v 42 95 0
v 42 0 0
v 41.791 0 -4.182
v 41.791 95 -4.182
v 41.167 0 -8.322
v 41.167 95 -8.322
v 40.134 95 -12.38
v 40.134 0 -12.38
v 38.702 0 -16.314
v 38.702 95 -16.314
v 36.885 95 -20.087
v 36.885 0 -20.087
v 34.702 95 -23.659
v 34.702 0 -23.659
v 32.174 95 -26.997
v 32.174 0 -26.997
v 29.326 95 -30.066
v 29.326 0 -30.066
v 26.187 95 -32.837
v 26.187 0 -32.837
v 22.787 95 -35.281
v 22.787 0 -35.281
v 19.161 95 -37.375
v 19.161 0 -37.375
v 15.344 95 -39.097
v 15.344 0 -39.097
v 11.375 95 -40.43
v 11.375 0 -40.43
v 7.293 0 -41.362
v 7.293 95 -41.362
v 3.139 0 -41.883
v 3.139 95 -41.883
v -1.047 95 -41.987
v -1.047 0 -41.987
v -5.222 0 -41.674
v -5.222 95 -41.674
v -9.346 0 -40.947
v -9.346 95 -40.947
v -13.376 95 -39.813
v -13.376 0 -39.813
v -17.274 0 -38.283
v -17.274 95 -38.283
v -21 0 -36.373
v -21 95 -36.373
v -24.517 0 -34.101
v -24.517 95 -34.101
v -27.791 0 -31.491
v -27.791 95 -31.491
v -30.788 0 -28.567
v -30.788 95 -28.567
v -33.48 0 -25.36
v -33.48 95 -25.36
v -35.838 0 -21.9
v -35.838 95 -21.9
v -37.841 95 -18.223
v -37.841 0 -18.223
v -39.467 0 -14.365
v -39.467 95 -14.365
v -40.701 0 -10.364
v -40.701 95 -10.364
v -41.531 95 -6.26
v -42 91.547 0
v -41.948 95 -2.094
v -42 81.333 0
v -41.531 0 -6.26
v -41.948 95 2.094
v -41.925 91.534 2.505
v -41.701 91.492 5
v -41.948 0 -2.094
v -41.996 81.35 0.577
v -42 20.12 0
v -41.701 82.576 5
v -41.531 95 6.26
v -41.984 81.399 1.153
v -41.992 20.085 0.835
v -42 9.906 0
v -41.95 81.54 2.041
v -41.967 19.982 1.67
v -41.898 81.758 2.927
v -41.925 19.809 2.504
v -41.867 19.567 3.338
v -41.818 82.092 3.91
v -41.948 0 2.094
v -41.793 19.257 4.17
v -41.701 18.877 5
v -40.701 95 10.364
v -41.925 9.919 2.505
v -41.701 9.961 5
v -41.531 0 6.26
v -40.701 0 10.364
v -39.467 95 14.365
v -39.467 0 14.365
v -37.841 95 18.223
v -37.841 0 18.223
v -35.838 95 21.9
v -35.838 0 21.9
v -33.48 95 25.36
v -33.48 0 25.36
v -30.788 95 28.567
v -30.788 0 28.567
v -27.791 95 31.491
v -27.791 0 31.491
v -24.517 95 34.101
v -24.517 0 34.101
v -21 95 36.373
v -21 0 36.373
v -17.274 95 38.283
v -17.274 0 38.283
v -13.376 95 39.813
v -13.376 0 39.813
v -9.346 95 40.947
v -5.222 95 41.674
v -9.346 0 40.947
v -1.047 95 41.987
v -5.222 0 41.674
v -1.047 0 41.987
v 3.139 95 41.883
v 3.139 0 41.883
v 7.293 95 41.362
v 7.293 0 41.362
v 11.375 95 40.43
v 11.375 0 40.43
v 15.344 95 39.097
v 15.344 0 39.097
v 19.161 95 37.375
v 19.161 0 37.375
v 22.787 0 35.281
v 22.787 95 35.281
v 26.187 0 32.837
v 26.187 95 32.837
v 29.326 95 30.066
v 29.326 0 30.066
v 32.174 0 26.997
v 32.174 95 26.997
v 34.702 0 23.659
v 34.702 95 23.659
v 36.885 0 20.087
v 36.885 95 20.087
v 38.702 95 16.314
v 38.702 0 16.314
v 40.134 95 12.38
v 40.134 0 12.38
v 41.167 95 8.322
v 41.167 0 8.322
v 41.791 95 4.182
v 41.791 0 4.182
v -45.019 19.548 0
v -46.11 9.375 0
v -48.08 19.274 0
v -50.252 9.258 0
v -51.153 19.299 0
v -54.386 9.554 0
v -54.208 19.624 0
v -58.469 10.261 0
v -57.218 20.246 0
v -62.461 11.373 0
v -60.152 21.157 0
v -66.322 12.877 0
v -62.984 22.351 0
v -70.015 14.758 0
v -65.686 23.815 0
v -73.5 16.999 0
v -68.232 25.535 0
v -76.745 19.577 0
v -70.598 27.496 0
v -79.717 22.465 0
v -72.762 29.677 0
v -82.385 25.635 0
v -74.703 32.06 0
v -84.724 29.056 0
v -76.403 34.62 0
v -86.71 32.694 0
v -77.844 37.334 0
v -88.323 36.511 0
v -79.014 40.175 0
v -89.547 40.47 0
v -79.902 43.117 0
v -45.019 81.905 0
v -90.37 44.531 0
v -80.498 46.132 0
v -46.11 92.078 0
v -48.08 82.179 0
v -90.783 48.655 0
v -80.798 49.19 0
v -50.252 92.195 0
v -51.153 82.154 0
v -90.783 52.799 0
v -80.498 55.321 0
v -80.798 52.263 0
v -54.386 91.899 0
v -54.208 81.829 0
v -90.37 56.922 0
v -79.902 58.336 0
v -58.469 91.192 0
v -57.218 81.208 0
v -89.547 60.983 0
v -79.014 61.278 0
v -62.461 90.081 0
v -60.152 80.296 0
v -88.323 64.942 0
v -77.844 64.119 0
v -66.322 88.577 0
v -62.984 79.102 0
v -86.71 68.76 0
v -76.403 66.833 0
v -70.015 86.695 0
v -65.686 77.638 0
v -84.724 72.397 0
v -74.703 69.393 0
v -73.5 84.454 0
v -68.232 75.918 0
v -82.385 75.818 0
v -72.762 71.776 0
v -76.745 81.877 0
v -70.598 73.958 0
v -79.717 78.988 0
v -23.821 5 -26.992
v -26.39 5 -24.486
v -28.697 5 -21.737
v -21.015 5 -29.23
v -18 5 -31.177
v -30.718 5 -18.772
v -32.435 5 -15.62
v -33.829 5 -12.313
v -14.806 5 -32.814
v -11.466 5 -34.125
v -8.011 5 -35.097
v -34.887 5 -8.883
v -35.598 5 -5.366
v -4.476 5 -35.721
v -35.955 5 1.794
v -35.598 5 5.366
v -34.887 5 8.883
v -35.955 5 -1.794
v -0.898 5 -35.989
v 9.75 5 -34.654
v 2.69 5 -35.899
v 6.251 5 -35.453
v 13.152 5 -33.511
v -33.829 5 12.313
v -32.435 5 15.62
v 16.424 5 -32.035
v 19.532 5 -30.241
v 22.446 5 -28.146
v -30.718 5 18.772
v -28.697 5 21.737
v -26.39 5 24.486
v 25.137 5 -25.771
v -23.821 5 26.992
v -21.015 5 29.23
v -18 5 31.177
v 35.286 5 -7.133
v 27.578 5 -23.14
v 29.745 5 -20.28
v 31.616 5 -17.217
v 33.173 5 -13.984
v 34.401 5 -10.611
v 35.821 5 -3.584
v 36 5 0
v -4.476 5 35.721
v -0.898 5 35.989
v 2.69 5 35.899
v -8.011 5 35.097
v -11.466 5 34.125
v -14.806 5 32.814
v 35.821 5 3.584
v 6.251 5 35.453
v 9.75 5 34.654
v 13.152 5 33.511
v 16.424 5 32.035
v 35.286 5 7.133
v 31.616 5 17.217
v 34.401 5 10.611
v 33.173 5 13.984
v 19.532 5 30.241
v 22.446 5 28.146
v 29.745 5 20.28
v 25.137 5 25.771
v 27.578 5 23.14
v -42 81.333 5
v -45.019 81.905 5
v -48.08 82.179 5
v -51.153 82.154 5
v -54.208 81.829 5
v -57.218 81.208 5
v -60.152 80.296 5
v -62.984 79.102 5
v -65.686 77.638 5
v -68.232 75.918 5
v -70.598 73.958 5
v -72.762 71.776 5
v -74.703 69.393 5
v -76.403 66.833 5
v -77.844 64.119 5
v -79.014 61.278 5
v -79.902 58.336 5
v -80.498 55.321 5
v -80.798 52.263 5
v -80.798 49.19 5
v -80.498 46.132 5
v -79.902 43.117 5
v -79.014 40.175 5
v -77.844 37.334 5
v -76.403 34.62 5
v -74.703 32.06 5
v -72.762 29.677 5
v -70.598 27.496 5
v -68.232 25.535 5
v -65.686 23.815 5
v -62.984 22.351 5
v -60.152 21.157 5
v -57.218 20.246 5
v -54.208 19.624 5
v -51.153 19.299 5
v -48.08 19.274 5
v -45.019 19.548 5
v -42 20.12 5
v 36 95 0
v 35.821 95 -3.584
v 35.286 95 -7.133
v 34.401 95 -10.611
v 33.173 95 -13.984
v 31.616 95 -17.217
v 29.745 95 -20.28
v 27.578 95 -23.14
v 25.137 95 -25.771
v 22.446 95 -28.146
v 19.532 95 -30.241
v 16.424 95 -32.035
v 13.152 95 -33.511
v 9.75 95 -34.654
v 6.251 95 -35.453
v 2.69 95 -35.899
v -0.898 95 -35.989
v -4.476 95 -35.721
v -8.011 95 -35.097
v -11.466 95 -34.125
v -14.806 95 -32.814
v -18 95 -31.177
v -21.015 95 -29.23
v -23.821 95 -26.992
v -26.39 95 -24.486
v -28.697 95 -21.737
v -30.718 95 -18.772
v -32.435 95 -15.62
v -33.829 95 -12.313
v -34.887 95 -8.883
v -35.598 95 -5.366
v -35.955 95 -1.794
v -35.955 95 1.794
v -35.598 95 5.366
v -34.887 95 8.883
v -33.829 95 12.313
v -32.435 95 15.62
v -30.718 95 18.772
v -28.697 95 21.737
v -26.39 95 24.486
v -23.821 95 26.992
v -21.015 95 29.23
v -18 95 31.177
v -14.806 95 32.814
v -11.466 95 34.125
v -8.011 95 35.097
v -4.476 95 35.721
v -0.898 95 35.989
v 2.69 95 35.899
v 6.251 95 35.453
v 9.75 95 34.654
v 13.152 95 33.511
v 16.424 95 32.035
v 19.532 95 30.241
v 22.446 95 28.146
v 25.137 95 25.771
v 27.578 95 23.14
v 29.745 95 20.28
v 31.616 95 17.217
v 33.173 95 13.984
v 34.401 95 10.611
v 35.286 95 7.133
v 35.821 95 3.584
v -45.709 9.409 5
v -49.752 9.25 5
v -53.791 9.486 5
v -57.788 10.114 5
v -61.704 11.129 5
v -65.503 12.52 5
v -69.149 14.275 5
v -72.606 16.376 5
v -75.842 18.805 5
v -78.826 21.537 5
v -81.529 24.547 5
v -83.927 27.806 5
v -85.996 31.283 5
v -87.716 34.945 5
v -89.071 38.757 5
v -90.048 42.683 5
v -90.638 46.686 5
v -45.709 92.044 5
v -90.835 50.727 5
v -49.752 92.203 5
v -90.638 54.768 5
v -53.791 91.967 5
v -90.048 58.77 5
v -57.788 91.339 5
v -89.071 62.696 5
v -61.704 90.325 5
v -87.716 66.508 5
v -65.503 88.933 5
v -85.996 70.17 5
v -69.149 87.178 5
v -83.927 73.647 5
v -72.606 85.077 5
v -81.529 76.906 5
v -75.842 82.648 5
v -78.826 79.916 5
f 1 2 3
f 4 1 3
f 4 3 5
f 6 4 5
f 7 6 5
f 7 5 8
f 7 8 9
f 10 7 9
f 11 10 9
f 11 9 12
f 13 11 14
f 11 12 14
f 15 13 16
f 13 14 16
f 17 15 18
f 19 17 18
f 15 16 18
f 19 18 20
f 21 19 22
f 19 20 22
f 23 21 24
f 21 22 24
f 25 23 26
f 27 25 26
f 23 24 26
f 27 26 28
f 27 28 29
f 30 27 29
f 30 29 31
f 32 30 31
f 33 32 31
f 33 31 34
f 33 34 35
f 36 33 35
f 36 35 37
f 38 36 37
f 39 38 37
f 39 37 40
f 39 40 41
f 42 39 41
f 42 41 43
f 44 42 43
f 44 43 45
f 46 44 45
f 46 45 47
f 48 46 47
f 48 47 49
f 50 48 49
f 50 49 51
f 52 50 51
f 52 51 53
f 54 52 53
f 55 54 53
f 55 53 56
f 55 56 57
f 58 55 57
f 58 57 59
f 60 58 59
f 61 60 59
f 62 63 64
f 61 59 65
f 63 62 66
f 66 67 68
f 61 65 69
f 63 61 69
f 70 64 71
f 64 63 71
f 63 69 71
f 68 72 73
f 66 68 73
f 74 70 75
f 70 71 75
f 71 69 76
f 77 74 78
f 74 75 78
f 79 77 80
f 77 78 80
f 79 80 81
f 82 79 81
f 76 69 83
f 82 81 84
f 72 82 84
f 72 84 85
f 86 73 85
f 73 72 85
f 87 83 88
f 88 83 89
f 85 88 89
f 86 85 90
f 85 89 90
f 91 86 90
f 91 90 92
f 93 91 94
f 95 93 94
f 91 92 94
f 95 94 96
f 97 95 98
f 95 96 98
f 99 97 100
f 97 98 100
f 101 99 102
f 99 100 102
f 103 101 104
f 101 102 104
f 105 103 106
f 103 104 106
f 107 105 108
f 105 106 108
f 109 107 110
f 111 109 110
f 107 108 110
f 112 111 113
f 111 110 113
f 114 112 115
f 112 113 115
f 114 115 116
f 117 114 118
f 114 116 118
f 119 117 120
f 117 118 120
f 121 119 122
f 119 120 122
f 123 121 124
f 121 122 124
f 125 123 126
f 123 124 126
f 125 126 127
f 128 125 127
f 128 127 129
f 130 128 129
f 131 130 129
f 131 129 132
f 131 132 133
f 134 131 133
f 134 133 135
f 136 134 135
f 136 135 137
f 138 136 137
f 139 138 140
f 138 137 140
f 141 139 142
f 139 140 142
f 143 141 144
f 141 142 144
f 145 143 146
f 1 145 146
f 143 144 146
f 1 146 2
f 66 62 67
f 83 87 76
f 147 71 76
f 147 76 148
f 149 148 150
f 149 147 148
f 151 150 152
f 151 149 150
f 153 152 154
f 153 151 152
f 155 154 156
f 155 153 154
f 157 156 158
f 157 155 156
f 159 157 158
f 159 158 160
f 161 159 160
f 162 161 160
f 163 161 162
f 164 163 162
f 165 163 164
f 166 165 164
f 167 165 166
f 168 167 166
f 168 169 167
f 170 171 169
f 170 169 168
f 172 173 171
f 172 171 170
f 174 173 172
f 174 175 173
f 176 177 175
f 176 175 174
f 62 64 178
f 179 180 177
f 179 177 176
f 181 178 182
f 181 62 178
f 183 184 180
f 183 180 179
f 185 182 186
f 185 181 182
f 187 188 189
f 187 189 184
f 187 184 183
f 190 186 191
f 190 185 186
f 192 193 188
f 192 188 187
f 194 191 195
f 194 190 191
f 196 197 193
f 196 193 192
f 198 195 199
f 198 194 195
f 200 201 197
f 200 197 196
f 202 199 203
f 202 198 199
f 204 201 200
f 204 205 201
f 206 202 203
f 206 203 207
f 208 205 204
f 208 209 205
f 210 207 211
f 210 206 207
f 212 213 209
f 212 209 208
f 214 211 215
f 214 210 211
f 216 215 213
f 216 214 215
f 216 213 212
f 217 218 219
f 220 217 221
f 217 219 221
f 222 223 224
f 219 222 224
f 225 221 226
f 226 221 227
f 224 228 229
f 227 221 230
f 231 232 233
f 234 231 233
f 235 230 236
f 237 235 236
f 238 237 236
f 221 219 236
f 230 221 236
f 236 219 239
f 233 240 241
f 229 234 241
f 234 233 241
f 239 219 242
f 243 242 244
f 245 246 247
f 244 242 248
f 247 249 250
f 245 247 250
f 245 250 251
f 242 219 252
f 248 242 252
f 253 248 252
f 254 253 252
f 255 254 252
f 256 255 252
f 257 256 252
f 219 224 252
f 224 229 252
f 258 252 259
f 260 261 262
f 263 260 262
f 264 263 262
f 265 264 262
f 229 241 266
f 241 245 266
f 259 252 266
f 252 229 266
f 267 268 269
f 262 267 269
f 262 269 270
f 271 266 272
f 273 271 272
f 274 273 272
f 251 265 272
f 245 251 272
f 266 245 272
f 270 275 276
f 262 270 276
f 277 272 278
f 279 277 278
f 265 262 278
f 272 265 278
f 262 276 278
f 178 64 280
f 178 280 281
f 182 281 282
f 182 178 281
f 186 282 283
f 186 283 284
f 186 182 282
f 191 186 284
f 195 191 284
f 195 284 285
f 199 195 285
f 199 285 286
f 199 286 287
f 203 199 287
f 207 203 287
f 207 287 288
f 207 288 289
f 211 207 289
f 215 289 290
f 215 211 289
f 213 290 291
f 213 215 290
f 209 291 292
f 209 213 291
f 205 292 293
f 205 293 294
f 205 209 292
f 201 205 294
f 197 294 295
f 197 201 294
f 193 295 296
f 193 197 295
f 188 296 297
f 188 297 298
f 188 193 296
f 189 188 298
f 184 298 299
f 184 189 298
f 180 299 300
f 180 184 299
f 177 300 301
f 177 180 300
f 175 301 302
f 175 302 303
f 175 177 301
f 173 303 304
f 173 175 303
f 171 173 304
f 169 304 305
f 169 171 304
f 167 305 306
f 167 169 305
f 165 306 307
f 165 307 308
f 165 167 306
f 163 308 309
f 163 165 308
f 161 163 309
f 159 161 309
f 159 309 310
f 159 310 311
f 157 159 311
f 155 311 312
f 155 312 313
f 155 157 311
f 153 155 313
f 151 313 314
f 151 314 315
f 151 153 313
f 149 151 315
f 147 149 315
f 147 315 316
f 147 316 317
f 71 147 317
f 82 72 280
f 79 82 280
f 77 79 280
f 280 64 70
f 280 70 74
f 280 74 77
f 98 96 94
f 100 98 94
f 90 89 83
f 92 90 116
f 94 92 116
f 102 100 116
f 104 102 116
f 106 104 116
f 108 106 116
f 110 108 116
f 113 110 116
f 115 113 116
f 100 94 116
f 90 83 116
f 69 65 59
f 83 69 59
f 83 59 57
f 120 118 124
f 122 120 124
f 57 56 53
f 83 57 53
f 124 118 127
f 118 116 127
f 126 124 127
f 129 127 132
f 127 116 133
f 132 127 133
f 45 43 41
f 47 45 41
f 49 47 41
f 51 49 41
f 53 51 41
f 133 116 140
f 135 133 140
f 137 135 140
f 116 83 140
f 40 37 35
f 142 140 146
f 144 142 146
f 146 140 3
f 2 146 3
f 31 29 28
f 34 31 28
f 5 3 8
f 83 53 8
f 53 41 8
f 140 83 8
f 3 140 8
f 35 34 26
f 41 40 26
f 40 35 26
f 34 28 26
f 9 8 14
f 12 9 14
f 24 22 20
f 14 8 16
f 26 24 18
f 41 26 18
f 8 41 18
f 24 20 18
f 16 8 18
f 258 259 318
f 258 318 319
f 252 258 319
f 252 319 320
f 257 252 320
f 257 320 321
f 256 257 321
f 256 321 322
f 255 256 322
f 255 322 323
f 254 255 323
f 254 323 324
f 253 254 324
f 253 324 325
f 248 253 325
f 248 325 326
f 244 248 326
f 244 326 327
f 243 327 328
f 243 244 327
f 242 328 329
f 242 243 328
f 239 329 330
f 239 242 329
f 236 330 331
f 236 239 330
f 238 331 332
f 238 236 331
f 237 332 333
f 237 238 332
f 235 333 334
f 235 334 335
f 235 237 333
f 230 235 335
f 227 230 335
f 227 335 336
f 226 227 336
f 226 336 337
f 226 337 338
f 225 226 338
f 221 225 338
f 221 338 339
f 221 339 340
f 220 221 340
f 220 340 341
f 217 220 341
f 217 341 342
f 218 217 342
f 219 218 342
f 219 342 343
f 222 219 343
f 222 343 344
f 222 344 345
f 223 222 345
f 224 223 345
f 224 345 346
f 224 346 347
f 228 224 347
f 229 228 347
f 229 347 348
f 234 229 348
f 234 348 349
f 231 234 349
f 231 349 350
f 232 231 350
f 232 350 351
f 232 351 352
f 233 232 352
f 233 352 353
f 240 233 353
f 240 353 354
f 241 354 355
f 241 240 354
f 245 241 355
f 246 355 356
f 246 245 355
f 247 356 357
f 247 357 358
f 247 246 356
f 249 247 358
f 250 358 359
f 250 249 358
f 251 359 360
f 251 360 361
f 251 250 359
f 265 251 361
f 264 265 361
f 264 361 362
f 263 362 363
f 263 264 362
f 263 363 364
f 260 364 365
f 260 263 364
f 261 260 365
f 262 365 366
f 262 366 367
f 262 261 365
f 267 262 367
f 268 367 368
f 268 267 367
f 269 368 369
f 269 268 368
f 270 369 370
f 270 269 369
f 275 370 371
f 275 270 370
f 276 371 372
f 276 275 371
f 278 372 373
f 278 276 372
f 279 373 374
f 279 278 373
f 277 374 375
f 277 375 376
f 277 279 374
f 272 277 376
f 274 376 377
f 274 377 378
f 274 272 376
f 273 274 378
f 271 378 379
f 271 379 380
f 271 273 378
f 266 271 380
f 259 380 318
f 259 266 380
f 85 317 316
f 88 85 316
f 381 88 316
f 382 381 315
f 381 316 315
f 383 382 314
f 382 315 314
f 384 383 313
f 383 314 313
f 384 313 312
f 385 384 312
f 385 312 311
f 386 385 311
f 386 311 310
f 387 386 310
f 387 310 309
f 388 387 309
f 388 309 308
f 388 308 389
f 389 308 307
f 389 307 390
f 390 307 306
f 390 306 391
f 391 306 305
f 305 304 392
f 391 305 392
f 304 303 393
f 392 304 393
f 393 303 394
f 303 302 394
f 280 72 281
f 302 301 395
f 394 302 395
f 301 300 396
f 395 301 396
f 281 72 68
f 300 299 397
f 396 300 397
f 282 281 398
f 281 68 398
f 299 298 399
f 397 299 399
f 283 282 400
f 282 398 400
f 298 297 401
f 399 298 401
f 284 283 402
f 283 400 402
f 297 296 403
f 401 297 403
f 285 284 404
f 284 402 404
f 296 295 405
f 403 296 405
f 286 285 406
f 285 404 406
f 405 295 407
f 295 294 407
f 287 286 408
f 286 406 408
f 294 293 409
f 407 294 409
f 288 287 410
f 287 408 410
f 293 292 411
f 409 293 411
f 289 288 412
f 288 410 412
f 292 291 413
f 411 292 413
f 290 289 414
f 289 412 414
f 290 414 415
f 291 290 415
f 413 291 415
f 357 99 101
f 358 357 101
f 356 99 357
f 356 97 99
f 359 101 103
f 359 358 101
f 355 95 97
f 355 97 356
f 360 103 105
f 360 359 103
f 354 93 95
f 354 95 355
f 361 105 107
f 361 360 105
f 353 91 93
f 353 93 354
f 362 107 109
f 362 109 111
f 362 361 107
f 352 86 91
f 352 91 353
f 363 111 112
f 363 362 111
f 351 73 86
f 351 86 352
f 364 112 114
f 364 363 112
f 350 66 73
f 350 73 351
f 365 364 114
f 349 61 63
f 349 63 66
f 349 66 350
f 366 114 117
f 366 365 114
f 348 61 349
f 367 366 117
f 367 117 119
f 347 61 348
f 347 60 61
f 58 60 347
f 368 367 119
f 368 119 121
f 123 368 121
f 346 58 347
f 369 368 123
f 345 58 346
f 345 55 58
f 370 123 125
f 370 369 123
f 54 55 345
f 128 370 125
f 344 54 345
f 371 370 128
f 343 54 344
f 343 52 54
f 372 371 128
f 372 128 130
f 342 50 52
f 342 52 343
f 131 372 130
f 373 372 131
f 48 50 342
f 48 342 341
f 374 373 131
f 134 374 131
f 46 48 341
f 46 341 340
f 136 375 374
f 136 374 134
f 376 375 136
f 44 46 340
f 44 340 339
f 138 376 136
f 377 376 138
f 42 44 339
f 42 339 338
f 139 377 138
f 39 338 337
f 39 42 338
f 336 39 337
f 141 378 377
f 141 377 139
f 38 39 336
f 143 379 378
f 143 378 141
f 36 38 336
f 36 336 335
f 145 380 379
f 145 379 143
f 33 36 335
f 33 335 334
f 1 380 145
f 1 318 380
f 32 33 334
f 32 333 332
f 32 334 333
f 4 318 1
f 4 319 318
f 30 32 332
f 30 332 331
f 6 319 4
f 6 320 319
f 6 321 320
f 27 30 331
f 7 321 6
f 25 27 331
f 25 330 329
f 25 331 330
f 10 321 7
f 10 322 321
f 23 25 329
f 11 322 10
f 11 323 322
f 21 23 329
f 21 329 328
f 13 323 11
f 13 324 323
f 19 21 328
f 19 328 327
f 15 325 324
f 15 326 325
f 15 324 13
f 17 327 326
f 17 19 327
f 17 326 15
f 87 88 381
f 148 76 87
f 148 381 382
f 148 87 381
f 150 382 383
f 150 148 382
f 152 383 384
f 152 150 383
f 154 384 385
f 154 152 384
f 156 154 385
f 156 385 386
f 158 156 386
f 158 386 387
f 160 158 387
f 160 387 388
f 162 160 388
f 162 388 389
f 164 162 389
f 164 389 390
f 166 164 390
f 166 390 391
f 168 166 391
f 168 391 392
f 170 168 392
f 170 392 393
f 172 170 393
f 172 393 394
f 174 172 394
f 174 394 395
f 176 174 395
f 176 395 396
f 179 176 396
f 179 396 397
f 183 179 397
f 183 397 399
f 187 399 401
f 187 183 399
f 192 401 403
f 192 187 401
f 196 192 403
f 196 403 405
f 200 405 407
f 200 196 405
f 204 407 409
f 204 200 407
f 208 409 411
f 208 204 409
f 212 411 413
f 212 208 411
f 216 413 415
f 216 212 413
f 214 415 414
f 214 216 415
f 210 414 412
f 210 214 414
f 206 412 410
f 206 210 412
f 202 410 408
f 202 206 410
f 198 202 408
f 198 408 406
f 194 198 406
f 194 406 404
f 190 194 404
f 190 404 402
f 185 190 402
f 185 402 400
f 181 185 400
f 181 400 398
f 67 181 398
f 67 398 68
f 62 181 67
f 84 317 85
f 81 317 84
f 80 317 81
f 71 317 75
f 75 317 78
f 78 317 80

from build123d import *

# Parameters (mm, degrees)
CROQUIS1_R              = 42
CROQUIS1_R_2            = 36
SALIENTE_EXTRUIR1_DEPTH = 95
CROQUIS2_R              = 42
SALIENTE_EXTRUIR2_DEPTH = 5
EXTRUIR_L_MINA1_DEPTH   = 5


with BuildPart() as part:
    # Croquis1 → Saliente-Extruir1 (new body)
    with BuildSketch(Plane(origin=(0, 0, 0), x_dir=(1, 0, 0), z_dir=(0, 1, 0))):
        Circle(CROQUIS1_R)
        Circle(CROQUIS1_R_2, mode=Mode.SUBTRACT)
    extrude(amount=SALIENTE_EXTRUIR1_DEPTH)

    # Croquis2 → Saliente-Extruir2 (add)
    with BuildSketch(Plane.XZ):
        Circle(CROQUIS2_R)
    extrude(amount=-SALIENTE_EXTRUIR2_DEPTH)

    # Croquis3 → Extruir-Lámina1 (add)
    with BuildSketch(Plane.XY):
        with BuildLine():
            ThreePointArc((-42, 81.333269167), (-80.835192592, 50.726606051), (-42, 20.119942936))
            Line((-42, 20.119942936), (-39.662910525, 10.396876918))
            ThreePointArc((-39.662910525, 10.396876918), (-90.835192592, 50.726606051), (-39.662910525, 91.056335185))
            Line((-39.662910525, 91.056335185), (-42, 81.333269167))
        make_face()
    extrude(amount=EXTRUIR_L_MINA1_DEPTH)


solid = part.part
